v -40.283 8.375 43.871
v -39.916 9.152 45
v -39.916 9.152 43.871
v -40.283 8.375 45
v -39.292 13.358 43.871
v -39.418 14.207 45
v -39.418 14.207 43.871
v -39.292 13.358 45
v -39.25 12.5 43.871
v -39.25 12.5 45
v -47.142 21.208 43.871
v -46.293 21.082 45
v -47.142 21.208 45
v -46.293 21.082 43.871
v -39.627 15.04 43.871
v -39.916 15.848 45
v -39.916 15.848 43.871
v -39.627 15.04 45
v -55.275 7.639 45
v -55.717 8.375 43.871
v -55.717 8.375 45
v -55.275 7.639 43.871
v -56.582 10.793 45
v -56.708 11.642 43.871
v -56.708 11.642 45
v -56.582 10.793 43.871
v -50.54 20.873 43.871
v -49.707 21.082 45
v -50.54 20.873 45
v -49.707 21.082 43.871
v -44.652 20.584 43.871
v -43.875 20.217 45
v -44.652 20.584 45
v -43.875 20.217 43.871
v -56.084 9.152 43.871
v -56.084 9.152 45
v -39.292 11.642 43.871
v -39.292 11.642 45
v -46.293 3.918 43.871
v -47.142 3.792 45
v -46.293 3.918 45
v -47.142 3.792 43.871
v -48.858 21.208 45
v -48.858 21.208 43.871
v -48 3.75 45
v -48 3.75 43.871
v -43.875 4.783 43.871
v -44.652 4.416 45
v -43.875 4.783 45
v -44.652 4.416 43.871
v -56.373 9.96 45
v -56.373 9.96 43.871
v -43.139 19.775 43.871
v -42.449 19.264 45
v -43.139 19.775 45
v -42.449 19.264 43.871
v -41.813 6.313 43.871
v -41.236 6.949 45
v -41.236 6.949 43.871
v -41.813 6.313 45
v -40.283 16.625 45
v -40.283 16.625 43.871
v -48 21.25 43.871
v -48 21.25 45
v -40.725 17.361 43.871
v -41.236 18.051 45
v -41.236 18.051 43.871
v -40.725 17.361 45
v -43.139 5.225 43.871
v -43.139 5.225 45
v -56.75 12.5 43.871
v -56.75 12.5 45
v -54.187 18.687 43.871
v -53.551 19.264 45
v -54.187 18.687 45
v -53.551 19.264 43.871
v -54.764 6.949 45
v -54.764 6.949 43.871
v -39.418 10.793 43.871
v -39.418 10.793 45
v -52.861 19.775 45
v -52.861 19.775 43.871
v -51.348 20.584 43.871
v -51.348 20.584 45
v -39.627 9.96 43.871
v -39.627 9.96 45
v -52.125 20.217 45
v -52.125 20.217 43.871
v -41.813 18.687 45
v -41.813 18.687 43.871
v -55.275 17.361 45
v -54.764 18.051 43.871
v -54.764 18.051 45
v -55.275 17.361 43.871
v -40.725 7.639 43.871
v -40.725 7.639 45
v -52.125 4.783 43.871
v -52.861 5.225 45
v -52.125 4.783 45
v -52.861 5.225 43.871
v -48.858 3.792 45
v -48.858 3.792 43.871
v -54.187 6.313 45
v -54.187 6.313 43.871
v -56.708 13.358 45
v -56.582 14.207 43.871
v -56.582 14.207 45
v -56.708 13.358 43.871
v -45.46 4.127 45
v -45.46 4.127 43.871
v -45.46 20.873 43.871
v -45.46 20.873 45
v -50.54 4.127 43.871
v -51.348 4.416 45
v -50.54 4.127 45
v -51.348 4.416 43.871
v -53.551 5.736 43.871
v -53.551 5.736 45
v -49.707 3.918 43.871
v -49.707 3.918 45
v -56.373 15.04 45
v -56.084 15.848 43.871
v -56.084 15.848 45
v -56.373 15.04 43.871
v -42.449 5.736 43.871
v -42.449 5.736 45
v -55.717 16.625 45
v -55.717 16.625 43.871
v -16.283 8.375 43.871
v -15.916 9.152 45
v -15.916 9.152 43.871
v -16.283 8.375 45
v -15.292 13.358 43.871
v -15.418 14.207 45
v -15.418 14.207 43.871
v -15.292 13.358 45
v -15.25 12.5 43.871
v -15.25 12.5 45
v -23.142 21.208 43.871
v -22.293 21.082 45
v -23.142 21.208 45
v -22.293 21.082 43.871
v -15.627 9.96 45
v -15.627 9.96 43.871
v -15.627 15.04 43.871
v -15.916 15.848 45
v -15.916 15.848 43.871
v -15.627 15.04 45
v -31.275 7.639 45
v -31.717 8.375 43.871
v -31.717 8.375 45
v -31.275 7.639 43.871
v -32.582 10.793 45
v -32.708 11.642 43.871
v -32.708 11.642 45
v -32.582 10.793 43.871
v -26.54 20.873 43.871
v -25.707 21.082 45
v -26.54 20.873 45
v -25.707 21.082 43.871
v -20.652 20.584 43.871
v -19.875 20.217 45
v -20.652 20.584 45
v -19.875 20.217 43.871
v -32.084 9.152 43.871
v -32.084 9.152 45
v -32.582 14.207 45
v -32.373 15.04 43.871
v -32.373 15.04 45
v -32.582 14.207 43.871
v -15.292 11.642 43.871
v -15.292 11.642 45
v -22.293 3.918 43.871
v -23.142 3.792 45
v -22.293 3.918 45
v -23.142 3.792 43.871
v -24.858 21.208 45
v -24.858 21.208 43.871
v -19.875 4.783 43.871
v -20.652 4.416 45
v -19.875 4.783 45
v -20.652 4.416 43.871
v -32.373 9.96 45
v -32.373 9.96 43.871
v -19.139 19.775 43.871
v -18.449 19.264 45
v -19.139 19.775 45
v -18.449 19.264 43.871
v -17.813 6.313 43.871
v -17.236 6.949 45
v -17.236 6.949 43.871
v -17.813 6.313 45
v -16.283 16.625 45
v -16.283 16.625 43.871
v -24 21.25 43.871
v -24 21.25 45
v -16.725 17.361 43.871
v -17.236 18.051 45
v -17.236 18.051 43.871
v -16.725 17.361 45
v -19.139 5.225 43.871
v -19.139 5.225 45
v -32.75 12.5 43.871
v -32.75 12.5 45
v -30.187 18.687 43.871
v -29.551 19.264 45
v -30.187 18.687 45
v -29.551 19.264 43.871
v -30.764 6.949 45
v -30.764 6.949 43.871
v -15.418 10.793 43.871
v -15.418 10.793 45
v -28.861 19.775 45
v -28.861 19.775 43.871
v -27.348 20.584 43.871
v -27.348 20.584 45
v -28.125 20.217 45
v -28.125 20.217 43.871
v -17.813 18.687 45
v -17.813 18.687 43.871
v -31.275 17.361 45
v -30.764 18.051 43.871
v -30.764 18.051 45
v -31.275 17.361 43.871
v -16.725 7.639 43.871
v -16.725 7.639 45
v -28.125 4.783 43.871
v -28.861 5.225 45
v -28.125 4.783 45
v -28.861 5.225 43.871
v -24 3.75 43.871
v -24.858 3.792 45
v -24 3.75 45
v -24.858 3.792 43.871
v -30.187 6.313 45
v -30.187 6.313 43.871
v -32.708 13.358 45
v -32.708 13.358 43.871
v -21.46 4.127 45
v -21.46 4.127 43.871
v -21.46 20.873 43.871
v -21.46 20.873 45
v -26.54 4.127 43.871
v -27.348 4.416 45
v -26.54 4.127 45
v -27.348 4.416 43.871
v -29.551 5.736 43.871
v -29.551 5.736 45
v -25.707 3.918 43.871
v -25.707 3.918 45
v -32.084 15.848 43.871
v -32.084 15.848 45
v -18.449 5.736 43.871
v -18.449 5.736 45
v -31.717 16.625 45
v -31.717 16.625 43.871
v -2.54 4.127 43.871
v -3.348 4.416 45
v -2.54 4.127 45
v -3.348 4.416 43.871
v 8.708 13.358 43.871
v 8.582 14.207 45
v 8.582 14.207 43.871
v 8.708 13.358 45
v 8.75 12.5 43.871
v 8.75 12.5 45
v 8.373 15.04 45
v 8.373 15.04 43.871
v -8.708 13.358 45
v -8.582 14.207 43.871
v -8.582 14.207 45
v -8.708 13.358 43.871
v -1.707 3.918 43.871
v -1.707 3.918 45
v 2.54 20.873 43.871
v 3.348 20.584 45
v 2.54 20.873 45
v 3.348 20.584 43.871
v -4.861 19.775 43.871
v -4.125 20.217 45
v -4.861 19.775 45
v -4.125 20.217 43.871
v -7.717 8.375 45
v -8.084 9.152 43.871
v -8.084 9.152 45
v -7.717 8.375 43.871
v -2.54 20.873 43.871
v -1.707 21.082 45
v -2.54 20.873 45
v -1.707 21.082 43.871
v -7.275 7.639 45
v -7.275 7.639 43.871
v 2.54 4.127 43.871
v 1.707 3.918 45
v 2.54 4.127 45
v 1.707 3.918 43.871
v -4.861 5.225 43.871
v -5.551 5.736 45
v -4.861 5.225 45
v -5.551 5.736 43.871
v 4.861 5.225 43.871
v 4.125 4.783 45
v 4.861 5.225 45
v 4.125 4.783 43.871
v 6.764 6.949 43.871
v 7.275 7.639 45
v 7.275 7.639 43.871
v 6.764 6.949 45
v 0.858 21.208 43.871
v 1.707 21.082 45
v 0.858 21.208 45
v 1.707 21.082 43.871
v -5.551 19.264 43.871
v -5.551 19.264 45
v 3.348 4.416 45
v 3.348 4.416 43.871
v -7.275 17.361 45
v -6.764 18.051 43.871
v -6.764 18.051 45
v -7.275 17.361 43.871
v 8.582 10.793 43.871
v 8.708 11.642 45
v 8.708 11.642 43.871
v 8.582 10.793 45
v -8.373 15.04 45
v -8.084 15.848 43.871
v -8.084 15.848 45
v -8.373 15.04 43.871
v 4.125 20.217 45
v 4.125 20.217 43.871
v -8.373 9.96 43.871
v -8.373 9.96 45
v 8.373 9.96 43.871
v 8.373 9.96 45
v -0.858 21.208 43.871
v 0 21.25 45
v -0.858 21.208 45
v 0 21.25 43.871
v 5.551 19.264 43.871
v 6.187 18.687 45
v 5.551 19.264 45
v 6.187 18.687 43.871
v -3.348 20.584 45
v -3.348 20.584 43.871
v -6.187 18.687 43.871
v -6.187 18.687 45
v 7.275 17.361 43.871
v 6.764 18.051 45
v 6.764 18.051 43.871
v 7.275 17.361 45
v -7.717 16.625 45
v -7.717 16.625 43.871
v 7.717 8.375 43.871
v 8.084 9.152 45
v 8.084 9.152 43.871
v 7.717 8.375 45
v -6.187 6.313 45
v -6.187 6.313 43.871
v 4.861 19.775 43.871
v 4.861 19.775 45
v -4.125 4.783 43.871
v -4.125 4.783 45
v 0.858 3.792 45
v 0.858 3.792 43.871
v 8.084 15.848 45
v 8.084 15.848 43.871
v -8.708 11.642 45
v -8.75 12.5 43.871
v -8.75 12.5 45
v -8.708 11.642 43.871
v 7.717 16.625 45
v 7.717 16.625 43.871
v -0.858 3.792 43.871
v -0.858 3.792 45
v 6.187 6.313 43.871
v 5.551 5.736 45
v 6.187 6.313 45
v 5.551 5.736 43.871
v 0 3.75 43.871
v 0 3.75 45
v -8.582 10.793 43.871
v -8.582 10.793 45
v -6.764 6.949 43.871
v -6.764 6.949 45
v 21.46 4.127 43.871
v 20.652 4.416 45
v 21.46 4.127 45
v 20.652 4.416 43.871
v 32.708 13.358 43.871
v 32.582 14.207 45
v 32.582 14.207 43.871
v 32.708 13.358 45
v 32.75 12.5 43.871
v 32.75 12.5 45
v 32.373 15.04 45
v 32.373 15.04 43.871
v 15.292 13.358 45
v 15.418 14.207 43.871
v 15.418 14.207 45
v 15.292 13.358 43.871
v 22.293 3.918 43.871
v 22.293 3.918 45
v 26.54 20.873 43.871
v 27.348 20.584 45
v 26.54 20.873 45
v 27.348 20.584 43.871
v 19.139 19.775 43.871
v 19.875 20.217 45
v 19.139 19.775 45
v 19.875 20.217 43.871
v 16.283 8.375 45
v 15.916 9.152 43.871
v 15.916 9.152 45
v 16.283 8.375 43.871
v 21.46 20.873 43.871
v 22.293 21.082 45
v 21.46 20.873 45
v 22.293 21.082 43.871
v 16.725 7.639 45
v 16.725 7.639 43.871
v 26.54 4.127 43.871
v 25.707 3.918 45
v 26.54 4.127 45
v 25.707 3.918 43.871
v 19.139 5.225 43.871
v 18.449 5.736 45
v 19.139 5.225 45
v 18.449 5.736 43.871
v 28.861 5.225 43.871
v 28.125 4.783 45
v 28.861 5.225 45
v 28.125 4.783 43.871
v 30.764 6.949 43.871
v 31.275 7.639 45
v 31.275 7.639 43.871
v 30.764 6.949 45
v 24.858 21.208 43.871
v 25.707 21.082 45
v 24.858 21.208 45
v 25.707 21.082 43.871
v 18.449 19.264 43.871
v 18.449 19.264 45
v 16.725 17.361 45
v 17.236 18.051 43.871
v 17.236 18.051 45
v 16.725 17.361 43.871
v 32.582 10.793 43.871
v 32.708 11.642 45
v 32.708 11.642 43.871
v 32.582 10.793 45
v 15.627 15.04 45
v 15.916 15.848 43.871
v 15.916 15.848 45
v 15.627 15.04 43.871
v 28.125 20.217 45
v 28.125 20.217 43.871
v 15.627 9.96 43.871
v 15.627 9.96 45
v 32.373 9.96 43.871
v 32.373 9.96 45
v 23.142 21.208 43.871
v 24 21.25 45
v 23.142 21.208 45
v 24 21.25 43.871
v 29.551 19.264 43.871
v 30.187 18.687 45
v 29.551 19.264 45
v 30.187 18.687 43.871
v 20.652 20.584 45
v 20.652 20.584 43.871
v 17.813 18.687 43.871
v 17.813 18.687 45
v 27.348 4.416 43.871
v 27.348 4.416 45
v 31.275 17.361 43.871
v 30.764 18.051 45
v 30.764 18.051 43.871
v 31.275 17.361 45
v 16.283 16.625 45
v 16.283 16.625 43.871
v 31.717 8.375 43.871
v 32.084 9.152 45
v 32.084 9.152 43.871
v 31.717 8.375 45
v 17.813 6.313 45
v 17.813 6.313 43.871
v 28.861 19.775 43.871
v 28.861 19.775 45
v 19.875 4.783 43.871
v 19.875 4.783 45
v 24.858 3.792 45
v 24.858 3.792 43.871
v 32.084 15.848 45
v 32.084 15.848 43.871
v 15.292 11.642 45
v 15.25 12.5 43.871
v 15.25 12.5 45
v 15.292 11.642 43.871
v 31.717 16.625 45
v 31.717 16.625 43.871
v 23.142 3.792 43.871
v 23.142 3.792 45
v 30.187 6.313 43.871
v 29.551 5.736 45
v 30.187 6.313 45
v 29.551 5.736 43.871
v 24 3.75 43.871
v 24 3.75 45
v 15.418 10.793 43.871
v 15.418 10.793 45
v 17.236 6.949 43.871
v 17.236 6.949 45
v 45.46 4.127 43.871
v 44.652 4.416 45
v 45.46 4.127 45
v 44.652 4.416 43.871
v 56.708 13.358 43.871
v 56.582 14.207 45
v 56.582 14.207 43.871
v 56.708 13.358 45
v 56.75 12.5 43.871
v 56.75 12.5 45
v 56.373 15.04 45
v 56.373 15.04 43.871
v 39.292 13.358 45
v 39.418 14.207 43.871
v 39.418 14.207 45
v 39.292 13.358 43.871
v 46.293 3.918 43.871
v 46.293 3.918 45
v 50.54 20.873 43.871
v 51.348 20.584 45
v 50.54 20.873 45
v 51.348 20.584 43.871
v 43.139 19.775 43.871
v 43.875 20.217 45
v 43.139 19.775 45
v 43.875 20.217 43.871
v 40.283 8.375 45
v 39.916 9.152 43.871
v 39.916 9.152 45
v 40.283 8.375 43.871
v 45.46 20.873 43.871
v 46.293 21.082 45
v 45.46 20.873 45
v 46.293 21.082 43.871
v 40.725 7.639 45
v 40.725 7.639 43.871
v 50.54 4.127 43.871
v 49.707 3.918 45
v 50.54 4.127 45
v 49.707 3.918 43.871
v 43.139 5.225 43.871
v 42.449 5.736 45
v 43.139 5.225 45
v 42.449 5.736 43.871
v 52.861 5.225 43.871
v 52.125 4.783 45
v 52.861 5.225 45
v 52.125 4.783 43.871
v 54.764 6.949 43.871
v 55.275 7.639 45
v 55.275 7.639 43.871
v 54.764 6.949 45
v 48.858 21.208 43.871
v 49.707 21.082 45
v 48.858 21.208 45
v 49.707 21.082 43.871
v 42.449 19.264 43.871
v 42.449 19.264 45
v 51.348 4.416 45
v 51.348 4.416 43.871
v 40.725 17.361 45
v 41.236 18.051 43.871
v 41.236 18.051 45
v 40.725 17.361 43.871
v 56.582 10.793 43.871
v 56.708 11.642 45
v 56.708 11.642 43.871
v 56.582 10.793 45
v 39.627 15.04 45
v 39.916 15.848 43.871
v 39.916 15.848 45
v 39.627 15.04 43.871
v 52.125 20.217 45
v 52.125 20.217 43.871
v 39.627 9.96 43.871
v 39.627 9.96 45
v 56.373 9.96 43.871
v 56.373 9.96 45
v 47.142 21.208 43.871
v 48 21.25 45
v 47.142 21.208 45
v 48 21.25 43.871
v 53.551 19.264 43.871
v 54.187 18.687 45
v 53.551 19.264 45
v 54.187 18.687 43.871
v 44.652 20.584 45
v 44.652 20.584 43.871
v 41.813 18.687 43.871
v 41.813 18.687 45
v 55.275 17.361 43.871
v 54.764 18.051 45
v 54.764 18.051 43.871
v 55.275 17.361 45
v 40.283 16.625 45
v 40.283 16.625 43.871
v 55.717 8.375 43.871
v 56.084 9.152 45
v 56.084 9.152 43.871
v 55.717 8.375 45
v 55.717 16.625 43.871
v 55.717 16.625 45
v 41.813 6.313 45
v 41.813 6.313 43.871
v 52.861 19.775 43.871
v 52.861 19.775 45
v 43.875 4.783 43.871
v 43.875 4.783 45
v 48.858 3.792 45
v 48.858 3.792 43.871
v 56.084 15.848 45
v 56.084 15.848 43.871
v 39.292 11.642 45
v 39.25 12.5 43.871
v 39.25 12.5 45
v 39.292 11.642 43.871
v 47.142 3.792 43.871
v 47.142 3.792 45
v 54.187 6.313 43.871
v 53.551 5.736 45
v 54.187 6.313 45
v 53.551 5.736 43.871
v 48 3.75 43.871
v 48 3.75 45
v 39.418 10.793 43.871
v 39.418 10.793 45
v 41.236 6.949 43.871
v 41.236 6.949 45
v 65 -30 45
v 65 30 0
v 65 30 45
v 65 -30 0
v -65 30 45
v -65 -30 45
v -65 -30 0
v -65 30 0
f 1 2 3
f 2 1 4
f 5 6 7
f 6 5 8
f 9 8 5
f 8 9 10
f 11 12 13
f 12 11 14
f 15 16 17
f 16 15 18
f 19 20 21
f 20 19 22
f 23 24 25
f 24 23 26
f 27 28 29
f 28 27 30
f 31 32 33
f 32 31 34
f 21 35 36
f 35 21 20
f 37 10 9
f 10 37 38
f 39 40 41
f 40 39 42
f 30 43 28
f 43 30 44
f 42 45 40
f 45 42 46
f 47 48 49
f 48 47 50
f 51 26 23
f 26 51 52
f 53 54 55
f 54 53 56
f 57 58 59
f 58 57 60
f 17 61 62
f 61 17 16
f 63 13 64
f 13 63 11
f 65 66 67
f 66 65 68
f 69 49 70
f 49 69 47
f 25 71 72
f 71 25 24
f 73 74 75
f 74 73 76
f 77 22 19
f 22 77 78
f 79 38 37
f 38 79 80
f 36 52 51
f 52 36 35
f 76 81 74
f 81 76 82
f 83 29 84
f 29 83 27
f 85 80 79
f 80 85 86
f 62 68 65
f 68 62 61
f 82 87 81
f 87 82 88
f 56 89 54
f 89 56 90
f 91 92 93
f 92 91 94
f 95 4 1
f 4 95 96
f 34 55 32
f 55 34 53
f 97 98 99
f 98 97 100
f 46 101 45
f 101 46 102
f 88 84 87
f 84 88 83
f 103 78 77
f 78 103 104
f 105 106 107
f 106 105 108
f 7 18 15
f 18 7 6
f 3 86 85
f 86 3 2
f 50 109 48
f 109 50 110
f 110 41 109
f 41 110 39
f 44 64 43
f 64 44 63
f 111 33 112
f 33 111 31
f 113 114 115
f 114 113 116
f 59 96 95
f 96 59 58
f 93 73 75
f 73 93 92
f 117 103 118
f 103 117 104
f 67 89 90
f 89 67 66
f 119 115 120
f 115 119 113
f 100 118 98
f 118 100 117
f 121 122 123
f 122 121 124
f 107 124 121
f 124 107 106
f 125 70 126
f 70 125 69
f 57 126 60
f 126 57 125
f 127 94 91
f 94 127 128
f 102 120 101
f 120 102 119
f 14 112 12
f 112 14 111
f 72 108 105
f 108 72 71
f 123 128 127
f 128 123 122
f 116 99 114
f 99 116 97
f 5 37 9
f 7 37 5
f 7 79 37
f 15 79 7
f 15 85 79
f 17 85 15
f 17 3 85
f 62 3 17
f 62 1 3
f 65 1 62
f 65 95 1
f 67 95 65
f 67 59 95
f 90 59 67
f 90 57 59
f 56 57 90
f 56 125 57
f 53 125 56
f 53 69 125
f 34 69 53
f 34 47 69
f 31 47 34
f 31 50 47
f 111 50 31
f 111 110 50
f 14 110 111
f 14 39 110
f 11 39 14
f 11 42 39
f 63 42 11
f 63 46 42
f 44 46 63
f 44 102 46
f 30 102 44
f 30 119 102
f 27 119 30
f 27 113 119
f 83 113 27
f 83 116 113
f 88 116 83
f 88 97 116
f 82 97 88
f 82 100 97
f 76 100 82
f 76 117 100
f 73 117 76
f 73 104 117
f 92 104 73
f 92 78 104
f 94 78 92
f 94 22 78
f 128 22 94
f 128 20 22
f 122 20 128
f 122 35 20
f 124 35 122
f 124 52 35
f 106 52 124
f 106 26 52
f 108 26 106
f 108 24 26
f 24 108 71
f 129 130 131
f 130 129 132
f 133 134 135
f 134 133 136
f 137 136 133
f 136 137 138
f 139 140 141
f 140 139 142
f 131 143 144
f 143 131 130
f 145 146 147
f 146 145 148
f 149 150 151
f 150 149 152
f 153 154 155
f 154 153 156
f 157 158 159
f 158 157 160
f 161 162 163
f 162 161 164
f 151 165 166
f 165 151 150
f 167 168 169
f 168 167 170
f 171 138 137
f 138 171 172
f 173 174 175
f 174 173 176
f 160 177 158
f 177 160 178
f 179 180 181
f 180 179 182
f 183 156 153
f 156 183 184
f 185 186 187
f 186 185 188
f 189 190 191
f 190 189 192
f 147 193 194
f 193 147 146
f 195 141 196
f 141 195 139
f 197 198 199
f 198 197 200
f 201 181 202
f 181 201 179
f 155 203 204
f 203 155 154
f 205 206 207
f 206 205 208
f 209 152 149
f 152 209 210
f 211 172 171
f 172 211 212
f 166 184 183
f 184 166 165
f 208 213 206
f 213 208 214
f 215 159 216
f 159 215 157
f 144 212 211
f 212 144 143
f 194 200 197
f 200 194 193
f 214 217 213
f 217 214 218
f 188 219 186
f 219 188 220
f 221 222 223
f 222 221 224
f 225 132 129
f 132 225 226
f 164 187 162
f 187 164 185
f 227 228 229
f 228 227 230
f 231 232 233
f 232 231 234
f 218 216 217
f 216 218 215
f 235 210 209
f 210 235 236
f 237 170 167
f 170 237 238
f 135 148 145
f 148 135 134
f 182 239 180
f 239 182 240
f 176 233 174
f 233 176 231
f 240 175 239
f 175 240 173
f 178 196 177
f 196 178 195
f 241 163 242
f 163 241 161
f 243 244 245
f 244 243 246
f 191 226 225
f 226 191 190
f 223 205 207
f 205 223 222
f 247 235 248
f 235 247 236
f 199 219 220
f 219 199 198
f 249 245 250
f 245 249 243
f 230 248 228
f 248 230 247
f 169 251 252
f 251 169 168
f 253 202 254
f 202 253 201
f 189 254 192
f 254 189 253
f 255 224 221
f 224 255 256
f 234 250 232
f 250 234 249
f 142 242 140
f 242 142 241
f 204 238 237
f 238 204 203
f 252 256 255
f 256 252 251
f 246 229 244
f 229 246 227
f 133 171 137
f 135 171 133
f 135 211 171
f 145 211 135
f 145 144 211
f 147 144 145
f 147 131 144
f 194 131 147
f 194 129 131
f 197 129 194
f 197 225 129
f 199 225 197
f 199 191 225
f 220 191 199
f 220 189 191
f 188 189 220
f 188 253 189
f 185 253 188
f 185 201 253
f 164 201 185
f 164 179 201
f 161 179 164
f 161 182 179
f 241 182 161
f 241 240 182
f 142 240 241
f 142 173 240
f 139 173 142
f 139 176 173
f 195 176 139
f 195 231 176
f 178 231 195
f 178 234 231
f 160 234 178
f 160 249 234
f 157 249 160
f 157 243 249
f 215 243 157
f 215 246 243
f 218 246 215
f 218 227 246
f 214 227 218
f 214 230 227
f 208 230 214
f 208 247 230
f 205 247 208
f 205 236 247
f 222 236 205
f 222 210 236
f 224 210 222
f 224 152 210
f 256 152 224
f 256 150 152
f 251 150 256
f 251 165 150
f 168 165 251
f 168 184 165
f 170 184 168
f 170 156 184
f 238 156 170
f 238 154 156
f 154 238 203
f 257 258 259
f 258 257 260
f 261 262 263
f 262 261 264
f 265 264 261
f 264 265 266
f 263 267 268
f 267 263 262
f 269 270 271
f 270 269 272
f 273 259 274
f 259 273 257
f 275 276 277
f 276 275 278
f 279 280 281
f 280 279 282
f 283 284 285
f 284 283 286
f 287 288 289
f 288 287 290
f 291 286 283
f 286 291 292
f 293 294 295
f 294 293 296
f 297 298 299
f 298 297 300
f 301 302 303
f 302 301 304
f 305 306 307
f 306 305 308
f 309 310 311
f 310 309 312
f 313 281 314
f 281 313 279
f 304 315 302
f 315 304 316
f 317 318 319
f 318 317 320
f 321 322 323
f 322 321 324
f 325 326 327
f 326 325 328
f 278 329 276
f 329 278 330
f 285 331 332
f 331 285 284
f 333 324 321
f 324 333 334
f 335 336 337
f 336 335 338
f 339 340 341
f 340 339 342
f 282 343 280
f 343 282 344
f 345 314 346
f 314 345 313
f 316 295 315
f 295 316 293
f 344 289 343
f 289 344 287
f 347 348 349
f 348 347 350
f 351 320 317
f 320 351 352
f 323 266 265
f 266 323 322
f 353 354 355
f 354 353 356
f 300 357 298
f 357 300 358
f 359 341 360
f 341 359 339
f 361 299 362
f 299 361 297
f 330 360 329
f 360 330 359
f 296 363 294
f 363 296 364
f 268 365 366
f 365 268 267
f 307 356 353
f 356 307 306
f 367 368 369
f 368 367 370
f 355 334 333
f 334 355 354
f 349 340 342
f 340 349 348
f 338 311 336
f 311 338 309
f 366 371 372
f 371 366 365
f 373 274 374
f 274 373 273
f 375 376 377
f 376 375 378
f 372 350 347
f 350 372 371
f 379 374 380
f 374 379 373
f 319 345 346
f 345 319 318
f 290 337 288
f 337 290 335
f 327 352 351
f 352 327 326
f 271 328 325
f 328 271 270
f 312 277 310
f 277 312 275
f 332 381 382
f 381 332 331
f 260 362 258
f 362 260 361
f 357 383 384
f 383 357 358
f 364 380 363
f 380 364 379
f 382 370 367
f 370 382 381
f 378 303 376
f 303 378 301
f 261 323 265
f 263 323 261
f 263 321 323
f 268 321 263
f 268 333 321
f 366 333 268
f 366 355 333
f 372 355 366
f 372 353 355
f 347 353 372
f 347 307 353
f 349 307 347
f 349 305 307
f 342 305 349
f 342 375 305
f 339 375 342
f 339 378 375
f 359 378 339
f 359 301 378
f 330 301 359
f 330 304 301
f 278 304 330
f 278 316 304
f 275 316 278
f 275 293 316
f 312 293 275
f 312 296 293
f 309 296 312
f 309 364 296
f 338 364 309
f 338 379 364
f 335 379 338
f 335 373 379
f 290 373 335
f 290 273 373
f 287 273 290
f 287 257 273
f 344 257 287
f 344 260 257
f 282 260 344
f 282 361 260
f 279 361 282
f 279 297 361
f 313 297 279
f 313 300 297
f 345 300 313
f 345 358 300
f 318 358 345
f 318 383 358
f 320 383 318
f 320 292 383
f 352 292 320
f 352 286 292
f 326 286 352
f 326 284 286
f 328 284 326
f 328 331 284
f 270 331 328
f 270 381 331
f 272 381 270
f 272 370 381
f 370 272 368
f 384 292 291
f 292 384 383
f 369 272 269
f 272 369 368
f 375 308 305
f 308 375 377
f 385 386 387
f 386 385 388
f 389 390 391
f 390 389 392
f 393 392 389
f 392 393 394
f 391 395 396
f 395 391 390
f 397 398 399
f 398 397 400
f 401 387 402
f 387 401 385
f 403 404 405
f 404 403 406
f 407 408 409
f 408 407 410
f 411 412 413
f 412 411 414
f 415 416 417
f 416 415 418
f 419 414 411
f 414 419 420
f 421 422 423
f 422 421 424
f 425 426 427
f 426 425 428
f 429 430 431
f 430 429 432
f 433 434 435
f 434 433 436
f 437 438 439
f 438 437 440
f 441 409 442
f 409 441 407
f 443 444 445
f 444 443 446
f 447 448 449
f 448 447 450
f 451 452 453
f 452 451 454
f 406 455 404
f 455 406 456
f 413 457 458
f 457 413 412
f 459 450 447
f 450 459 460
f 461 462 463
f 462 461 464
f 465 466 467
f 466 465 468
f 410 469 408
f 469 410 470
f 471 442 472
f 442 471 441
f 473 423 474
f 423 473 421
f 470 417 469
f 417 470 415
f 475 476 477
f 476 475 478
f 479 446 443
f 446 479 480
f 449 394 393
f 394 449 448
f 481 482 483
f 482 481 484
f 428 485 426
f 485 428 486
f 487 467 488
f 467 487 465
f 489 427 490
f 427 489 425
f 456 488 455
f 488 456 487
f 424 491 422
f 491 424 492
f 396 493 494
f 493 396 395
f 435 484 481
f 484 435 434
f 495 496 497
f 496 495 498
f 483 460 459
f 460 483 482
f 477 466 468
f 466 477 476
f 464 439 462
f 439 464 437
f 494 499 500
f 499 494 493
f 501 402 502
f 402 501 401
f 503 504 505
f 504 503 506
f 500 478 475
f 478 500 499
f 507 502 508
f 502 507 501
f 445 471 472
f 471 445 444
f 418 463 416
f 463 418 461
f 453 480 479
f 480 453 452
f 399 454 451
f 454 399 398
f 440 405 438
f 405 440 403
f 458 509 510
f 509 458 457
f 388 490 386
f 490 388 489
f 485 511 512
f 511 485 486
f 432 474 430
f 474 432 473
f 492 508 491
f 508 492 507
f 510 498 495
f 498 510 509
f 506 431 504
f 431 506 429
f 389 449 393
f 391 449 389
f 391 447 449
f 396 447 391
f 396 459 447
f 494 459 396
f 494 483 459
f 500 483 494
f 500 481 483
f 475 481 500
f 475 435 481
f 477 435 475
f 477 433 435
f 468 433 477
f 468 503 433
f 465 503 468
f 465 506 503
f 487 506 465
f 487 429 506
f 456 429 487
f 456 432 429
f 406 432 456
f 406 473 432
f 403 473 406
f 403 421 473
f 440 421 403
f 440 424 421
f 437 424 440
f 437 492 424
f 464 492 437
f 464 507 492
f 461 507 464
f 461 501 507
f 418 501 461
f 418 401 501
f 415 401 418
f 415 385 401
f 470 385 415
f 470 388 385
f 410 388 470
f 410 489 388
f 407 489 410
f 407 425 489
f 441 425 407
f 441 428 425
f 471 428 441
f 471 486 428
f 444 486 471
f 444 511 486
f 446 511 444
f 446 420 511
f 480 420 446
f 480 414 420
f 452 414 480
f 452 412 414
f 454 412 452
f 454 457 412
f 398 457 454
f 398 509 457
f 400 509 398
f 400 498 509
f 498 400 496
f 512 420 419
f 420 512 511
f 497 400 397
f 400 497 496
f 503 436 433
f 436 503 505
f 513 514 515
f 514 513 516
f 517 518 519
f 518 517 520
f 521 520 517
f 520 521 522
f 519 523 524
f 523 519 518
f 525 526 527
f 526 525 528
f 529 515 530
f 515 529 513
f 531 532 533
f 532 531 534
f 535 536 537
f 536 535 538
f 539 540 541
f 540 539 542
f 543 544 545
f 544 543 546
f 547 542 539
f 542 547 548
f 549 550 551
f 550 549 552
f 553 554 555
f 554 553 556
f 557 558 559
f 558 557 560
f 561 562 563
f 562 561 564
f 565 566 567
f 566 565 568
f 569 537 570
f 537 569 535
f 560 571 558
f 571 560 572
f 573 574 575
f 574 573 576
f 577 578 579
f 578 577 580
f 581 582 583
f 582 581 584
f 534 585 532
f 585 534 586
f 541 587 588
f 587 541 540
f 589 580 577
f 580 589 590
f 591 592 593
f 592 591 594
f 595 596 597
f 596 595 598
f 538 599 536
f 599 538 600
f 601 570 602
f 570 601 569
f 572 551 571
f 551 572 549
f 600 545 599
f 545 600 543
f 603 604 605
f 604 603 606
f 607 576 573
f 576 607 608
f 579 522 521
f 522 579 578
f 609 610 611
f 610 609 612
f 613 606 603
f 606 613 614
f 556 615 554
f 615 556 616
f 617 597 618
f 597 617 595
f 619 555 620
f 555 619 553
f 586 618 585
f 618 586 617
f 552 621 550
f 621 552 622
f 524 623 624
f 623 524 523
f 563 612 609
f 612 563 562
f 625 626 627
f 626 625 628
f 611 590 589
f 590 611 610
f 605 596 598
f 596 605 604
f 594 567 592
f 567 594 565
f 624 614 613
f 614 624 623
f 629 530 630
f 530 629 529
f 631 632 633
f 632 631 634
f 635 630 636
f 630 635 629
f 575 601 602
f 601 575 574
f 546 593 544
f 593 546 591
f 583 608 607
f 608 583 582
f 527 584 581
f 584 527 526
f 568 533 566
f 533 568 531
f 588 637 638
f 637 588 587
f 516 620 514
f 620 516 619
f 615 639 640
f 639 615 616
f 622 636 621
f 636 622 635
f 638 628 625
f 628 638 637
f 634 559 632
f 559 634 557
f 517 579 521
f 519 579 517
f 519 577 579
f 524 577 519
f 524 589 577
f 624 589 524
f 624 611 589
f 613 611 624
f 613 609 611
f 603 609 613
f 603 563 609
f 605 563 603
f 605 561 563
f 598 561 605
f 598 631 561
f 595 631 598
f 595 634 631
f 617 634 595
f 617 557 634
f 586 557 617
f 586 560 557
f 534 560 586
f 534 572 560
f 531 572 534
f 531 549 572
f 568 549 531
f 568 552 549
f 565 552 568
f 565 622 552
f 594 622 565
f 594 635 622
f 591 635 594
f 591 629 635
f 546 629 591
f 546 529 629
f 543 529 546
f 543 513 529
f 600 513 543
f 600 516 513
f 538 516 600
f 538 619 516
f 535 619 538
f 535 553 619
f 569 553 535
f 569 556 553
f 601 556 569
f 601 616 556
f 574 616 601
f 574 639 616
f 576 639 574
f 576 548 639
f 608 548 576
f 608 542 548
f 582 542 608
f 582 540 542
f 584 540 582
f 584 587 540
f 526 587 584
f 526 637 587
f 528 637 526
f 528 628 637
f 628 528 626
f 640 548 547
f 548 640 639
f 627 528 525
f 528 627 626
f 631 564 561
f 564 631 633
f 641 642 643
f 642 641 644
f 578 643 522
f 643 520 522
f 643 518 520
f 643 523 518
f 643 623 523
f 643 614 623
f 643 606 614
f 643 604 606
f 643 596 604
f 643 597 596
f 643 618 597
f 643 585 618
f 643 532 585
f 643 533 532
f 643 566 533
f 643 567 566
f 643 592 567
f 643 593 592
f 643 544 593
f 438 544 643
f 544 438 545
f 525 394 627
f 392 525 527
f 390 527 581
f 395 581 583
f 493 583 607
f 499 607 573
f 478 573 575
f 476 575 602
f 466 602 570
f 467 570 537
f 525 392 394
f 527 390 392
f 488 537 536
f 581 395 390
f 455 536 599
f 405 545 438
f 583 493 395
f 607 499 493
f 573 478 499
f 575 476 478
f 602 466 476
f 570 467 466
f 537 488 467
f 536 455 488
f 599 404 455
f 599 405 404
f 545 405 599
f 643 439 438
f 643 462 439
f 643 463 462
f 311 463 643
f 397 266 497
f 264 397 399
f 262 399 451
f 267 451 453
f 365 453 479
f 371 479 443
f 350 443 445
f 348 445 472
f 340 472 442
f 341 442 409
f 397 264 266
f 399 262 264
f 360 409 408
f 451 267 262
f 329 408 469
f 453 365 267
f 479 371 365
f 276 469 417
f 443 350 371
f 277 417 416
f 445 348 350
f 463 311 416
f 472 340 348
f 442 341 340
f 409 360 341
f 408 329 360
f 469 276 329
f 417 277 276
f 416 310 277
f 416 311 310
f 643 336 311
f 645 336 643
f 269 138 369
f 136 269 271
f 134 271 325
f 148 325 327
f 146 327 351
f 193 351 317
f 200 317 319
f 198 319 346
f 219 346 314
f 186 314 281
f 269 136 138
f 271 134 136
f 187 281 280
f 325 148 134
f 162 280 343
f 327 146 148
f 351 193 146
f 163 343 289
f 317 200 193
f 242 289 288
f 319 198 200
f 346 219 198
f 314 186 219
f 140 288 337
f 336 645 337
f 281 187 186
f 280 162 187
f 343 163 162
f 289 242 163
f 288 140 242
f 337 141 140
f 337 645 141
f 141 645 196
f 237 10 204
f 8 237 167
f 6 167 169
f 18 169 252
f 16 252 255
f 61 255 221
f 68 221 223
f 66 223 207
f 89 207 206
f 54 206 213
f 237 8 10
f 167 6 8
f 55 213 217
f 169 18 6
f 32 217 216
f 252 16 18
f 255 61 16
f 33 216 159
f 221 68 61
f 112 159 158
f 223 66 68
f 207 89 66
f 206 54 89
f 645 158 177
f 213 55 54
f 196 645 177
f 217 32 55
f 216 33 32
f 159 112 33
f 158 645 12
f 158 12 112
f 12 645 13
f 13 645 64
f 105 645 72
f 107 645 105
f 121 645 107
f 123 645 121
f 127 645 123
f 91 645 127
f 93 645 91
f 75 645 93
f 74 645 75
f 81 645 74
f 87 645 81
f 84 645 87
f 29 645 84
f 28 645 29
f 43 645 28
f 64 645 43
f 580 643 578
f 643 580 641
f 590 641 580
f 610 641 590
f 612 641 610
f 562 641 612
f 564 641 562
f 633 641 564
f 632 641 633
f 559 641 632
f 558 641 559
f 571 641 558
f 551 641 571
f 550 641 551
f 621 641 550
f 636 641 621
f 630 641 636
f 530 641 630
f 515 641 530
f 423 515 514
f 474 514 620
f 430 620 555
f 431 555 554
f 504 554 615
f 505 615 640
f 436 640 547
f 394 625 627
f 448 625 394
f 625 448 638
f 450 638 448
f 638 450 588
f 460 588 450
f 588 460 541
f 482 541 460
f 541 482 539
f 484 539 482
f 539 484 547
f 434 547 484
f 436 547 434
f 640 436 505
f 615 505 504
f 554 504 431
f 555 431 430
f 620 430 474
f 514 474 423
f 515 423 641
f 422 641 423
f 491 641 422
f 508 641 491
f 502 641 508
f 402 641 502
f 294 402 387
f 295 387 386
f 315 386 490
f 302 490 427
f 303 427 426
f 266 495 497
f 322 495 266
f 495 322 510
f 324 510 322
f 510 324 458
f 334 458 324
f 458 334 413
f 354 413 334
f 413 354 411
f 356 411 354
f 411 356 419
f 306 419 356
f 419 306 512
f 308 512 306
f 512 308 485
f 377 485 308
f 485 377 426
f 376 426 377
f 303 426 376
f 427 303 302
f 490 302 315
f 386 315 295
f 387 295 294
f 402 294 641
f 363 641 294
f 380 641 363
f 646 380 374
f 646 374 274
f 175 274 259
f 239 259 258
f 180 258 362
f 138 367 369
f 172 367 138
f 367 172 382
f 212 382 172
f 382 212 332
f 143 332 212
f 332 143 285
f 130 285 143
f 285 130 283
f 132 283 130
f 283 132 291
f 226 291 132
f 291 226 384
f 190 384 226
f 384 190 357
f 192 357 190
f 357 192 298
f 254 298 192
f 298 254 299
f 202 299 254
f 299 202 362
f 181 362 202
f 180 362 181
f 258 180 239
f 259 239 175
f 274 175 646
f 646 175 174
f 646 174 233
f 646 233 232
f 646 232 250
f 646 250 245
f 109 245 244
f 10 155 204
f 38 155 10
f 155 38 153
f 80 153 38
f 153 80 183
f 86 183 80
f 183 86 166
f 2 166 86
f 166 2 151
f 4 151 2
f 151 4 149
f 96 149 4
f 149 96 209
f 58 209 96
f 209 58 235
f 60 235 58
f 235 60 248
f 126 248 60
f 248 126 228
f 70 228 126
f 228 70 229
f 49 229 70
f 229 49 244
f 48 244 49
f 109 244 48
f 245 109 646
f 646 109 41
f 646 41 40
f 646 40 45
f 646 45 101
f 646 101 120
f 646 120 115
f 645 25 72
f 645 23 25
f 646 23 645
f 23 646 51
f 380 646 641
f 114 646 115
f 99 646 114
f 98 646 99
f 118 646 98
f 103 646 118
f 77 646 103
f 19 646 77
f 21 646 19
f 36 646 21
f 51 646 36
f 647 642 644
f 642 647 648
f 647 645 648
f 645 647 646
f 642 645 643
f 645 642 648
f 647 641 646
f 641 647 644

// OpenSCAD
// --- Dimensions ---
block_x = 130;           // Length of the block (X)
block_y = 60;            // Depth of the block (Y)
block_z = 45;            // Height of the block (Z)

num_holes = 5;           // Number of tube holes
hole_spacing = 24;       // Distance between hole centers (X)
hole_diameter = 17.5;    // Diameter of the holes
hole_depth = 40;         // Depth of the holes along their axis

tilt_angle = 30;         // Tilt angle from vertical (degrees)
tilt_y_offset = -10;     // Y-coordinate where the hole axis meets the top face

// --- Constants ---
$fn = 64;                // Smoothness for cylinders
eps = 0.1;               // Small offset for boolean operations

// --- Calculations ---
// The total span of holes is (num_holes - 1) * hole_spacing
hole_span = (num_holes - 1) * hole_spacing;
start_x = -(hole_span / 2);

// --- Main Model ---
difference() {
    // The main block
    // Centered on origin in X and Y, resting on Z=0
    translate([-block_x/2, -block_y/2, 0])
        cube([block_x, block_y, block_z]);

    // The five blind holes
    for (i = [0 : num_holes - 1]) {
        // Calculate X position for this hole
        current_x = start_x + (i * hole_spacing);
        
        // Hole placement logic:
        // 1. The axis meets the top face at (current_x, tilt_y_offset, block_z).
        // 2. The axis is tilted 30 degrees from vertical towards +Y.
        // 3. A cylinder drawn from Z=0 to Z=H, when rotated by 30 deg around X,
        //    has its top face at Z = H * cos(30).
        // 4. To align the top face of the cylinder with the top face of the block (Z=45),
        //    we must translate the cylinder by (block_z - hole_depth * cos(30)).
        //    However, it is simpler to rotate the cylinder and then translate its 
        //    top-center to the target coordinate.
        
        // To tilt the Z-axis towards +Y, we rotate around the X-axis by -30 degrees.
        // Wait, let's re-verify: 
        // rotate([30, 0, 0]) on (0,0,1) -> (0, sin(30), cos(30)) = (0, 0.5, 0.866).
        // This vector points towards +Y and +Z.
        // Since we want the hole to go DOWN into the block (-Z) and towards +Y,
        // we want the vector to be (0, sin(30), -cos(30)).
        // This is achieved by rotating the cylinder by -30 degrees around X.
        
        // Let's use a more robust method:
        // We create a cylinder that is already oriented correctly, then move its top face.
        
        translate([current_x, tilt_y_offset, block_z])
            rotate([-tilt_angle, 0, 0]) // Rotate -30 deg around X to tilt Z towards +Y
                // We translate the cylinder downwards so its top face is at Z=0 
                // (relative to the rotation) and then move it to the top face.
                // Since the cylinder is drawn from Z=0 to Z=H, and we rotated it,
                // the top face is at Z=0 and the bottom is at Z=H*cos(30).
                // We need to translate it so the top face is at Z=block_z.
                // But the rotation is around the origin.
                // Let's use a simpler approach:
                // 1. Create cylinder from Z=0 to Z=H.
                // 2. Rotate it.
                // 3. Translate it so the top face (originally at Z=0) is at Z=block_z.
                //    Wait, if we rotate by -30, the top face (Z=0) stays at Z=0.
                //    The bottom face (Z=H) moves to Z = H * cos(-30) = H * cos(30).
                //    So we translate by block_z to put the top face at block_z.
                //    However, the rotation also shifts the Y coordinate.
                //    The center of the top face is (0,0,0).
                //    The center of the bottom face is (0, -H*sin(30), H*cos(30)).
                //    Wait, if we rotate by -30 around X, the Z axis (0,0,1) becomes (0, sin(-30), cos(-30)).
                //    That is (0, -0.5, 0.866). That tilts towards -Y.
                //    We want +Y. So we rotate by +30 degrees.
                //    rotate([30, 0, 0]) on (0,0,1) -> (0, sin(30), cos(30)) = (0, 0.5, 0.866).
                //    This tilts towards +Y.
                //    Now, the cylinder is at Z=0 to Z=H. The top face is at Z=H*cos(30).
                //    To put the top face at Z=block_z, we translate by (block_z - hole_depth * cos(30)).
                //    Wait, the user says "axis meets the top face at y = -10".
                //    This means the center of the top face is at (current_x, -10, 45).
                
                translate([0, 0, block_z]) // Move top face to block_z
                    rotate([30, 0, 0])    // Tilt Z towards +Y
                        translate([0, 0, -hole_depth - eps]) // Move cylinder down from top face
                            cylinder(h = hole_depth + eps, d = hole_diameter);
    }
}
